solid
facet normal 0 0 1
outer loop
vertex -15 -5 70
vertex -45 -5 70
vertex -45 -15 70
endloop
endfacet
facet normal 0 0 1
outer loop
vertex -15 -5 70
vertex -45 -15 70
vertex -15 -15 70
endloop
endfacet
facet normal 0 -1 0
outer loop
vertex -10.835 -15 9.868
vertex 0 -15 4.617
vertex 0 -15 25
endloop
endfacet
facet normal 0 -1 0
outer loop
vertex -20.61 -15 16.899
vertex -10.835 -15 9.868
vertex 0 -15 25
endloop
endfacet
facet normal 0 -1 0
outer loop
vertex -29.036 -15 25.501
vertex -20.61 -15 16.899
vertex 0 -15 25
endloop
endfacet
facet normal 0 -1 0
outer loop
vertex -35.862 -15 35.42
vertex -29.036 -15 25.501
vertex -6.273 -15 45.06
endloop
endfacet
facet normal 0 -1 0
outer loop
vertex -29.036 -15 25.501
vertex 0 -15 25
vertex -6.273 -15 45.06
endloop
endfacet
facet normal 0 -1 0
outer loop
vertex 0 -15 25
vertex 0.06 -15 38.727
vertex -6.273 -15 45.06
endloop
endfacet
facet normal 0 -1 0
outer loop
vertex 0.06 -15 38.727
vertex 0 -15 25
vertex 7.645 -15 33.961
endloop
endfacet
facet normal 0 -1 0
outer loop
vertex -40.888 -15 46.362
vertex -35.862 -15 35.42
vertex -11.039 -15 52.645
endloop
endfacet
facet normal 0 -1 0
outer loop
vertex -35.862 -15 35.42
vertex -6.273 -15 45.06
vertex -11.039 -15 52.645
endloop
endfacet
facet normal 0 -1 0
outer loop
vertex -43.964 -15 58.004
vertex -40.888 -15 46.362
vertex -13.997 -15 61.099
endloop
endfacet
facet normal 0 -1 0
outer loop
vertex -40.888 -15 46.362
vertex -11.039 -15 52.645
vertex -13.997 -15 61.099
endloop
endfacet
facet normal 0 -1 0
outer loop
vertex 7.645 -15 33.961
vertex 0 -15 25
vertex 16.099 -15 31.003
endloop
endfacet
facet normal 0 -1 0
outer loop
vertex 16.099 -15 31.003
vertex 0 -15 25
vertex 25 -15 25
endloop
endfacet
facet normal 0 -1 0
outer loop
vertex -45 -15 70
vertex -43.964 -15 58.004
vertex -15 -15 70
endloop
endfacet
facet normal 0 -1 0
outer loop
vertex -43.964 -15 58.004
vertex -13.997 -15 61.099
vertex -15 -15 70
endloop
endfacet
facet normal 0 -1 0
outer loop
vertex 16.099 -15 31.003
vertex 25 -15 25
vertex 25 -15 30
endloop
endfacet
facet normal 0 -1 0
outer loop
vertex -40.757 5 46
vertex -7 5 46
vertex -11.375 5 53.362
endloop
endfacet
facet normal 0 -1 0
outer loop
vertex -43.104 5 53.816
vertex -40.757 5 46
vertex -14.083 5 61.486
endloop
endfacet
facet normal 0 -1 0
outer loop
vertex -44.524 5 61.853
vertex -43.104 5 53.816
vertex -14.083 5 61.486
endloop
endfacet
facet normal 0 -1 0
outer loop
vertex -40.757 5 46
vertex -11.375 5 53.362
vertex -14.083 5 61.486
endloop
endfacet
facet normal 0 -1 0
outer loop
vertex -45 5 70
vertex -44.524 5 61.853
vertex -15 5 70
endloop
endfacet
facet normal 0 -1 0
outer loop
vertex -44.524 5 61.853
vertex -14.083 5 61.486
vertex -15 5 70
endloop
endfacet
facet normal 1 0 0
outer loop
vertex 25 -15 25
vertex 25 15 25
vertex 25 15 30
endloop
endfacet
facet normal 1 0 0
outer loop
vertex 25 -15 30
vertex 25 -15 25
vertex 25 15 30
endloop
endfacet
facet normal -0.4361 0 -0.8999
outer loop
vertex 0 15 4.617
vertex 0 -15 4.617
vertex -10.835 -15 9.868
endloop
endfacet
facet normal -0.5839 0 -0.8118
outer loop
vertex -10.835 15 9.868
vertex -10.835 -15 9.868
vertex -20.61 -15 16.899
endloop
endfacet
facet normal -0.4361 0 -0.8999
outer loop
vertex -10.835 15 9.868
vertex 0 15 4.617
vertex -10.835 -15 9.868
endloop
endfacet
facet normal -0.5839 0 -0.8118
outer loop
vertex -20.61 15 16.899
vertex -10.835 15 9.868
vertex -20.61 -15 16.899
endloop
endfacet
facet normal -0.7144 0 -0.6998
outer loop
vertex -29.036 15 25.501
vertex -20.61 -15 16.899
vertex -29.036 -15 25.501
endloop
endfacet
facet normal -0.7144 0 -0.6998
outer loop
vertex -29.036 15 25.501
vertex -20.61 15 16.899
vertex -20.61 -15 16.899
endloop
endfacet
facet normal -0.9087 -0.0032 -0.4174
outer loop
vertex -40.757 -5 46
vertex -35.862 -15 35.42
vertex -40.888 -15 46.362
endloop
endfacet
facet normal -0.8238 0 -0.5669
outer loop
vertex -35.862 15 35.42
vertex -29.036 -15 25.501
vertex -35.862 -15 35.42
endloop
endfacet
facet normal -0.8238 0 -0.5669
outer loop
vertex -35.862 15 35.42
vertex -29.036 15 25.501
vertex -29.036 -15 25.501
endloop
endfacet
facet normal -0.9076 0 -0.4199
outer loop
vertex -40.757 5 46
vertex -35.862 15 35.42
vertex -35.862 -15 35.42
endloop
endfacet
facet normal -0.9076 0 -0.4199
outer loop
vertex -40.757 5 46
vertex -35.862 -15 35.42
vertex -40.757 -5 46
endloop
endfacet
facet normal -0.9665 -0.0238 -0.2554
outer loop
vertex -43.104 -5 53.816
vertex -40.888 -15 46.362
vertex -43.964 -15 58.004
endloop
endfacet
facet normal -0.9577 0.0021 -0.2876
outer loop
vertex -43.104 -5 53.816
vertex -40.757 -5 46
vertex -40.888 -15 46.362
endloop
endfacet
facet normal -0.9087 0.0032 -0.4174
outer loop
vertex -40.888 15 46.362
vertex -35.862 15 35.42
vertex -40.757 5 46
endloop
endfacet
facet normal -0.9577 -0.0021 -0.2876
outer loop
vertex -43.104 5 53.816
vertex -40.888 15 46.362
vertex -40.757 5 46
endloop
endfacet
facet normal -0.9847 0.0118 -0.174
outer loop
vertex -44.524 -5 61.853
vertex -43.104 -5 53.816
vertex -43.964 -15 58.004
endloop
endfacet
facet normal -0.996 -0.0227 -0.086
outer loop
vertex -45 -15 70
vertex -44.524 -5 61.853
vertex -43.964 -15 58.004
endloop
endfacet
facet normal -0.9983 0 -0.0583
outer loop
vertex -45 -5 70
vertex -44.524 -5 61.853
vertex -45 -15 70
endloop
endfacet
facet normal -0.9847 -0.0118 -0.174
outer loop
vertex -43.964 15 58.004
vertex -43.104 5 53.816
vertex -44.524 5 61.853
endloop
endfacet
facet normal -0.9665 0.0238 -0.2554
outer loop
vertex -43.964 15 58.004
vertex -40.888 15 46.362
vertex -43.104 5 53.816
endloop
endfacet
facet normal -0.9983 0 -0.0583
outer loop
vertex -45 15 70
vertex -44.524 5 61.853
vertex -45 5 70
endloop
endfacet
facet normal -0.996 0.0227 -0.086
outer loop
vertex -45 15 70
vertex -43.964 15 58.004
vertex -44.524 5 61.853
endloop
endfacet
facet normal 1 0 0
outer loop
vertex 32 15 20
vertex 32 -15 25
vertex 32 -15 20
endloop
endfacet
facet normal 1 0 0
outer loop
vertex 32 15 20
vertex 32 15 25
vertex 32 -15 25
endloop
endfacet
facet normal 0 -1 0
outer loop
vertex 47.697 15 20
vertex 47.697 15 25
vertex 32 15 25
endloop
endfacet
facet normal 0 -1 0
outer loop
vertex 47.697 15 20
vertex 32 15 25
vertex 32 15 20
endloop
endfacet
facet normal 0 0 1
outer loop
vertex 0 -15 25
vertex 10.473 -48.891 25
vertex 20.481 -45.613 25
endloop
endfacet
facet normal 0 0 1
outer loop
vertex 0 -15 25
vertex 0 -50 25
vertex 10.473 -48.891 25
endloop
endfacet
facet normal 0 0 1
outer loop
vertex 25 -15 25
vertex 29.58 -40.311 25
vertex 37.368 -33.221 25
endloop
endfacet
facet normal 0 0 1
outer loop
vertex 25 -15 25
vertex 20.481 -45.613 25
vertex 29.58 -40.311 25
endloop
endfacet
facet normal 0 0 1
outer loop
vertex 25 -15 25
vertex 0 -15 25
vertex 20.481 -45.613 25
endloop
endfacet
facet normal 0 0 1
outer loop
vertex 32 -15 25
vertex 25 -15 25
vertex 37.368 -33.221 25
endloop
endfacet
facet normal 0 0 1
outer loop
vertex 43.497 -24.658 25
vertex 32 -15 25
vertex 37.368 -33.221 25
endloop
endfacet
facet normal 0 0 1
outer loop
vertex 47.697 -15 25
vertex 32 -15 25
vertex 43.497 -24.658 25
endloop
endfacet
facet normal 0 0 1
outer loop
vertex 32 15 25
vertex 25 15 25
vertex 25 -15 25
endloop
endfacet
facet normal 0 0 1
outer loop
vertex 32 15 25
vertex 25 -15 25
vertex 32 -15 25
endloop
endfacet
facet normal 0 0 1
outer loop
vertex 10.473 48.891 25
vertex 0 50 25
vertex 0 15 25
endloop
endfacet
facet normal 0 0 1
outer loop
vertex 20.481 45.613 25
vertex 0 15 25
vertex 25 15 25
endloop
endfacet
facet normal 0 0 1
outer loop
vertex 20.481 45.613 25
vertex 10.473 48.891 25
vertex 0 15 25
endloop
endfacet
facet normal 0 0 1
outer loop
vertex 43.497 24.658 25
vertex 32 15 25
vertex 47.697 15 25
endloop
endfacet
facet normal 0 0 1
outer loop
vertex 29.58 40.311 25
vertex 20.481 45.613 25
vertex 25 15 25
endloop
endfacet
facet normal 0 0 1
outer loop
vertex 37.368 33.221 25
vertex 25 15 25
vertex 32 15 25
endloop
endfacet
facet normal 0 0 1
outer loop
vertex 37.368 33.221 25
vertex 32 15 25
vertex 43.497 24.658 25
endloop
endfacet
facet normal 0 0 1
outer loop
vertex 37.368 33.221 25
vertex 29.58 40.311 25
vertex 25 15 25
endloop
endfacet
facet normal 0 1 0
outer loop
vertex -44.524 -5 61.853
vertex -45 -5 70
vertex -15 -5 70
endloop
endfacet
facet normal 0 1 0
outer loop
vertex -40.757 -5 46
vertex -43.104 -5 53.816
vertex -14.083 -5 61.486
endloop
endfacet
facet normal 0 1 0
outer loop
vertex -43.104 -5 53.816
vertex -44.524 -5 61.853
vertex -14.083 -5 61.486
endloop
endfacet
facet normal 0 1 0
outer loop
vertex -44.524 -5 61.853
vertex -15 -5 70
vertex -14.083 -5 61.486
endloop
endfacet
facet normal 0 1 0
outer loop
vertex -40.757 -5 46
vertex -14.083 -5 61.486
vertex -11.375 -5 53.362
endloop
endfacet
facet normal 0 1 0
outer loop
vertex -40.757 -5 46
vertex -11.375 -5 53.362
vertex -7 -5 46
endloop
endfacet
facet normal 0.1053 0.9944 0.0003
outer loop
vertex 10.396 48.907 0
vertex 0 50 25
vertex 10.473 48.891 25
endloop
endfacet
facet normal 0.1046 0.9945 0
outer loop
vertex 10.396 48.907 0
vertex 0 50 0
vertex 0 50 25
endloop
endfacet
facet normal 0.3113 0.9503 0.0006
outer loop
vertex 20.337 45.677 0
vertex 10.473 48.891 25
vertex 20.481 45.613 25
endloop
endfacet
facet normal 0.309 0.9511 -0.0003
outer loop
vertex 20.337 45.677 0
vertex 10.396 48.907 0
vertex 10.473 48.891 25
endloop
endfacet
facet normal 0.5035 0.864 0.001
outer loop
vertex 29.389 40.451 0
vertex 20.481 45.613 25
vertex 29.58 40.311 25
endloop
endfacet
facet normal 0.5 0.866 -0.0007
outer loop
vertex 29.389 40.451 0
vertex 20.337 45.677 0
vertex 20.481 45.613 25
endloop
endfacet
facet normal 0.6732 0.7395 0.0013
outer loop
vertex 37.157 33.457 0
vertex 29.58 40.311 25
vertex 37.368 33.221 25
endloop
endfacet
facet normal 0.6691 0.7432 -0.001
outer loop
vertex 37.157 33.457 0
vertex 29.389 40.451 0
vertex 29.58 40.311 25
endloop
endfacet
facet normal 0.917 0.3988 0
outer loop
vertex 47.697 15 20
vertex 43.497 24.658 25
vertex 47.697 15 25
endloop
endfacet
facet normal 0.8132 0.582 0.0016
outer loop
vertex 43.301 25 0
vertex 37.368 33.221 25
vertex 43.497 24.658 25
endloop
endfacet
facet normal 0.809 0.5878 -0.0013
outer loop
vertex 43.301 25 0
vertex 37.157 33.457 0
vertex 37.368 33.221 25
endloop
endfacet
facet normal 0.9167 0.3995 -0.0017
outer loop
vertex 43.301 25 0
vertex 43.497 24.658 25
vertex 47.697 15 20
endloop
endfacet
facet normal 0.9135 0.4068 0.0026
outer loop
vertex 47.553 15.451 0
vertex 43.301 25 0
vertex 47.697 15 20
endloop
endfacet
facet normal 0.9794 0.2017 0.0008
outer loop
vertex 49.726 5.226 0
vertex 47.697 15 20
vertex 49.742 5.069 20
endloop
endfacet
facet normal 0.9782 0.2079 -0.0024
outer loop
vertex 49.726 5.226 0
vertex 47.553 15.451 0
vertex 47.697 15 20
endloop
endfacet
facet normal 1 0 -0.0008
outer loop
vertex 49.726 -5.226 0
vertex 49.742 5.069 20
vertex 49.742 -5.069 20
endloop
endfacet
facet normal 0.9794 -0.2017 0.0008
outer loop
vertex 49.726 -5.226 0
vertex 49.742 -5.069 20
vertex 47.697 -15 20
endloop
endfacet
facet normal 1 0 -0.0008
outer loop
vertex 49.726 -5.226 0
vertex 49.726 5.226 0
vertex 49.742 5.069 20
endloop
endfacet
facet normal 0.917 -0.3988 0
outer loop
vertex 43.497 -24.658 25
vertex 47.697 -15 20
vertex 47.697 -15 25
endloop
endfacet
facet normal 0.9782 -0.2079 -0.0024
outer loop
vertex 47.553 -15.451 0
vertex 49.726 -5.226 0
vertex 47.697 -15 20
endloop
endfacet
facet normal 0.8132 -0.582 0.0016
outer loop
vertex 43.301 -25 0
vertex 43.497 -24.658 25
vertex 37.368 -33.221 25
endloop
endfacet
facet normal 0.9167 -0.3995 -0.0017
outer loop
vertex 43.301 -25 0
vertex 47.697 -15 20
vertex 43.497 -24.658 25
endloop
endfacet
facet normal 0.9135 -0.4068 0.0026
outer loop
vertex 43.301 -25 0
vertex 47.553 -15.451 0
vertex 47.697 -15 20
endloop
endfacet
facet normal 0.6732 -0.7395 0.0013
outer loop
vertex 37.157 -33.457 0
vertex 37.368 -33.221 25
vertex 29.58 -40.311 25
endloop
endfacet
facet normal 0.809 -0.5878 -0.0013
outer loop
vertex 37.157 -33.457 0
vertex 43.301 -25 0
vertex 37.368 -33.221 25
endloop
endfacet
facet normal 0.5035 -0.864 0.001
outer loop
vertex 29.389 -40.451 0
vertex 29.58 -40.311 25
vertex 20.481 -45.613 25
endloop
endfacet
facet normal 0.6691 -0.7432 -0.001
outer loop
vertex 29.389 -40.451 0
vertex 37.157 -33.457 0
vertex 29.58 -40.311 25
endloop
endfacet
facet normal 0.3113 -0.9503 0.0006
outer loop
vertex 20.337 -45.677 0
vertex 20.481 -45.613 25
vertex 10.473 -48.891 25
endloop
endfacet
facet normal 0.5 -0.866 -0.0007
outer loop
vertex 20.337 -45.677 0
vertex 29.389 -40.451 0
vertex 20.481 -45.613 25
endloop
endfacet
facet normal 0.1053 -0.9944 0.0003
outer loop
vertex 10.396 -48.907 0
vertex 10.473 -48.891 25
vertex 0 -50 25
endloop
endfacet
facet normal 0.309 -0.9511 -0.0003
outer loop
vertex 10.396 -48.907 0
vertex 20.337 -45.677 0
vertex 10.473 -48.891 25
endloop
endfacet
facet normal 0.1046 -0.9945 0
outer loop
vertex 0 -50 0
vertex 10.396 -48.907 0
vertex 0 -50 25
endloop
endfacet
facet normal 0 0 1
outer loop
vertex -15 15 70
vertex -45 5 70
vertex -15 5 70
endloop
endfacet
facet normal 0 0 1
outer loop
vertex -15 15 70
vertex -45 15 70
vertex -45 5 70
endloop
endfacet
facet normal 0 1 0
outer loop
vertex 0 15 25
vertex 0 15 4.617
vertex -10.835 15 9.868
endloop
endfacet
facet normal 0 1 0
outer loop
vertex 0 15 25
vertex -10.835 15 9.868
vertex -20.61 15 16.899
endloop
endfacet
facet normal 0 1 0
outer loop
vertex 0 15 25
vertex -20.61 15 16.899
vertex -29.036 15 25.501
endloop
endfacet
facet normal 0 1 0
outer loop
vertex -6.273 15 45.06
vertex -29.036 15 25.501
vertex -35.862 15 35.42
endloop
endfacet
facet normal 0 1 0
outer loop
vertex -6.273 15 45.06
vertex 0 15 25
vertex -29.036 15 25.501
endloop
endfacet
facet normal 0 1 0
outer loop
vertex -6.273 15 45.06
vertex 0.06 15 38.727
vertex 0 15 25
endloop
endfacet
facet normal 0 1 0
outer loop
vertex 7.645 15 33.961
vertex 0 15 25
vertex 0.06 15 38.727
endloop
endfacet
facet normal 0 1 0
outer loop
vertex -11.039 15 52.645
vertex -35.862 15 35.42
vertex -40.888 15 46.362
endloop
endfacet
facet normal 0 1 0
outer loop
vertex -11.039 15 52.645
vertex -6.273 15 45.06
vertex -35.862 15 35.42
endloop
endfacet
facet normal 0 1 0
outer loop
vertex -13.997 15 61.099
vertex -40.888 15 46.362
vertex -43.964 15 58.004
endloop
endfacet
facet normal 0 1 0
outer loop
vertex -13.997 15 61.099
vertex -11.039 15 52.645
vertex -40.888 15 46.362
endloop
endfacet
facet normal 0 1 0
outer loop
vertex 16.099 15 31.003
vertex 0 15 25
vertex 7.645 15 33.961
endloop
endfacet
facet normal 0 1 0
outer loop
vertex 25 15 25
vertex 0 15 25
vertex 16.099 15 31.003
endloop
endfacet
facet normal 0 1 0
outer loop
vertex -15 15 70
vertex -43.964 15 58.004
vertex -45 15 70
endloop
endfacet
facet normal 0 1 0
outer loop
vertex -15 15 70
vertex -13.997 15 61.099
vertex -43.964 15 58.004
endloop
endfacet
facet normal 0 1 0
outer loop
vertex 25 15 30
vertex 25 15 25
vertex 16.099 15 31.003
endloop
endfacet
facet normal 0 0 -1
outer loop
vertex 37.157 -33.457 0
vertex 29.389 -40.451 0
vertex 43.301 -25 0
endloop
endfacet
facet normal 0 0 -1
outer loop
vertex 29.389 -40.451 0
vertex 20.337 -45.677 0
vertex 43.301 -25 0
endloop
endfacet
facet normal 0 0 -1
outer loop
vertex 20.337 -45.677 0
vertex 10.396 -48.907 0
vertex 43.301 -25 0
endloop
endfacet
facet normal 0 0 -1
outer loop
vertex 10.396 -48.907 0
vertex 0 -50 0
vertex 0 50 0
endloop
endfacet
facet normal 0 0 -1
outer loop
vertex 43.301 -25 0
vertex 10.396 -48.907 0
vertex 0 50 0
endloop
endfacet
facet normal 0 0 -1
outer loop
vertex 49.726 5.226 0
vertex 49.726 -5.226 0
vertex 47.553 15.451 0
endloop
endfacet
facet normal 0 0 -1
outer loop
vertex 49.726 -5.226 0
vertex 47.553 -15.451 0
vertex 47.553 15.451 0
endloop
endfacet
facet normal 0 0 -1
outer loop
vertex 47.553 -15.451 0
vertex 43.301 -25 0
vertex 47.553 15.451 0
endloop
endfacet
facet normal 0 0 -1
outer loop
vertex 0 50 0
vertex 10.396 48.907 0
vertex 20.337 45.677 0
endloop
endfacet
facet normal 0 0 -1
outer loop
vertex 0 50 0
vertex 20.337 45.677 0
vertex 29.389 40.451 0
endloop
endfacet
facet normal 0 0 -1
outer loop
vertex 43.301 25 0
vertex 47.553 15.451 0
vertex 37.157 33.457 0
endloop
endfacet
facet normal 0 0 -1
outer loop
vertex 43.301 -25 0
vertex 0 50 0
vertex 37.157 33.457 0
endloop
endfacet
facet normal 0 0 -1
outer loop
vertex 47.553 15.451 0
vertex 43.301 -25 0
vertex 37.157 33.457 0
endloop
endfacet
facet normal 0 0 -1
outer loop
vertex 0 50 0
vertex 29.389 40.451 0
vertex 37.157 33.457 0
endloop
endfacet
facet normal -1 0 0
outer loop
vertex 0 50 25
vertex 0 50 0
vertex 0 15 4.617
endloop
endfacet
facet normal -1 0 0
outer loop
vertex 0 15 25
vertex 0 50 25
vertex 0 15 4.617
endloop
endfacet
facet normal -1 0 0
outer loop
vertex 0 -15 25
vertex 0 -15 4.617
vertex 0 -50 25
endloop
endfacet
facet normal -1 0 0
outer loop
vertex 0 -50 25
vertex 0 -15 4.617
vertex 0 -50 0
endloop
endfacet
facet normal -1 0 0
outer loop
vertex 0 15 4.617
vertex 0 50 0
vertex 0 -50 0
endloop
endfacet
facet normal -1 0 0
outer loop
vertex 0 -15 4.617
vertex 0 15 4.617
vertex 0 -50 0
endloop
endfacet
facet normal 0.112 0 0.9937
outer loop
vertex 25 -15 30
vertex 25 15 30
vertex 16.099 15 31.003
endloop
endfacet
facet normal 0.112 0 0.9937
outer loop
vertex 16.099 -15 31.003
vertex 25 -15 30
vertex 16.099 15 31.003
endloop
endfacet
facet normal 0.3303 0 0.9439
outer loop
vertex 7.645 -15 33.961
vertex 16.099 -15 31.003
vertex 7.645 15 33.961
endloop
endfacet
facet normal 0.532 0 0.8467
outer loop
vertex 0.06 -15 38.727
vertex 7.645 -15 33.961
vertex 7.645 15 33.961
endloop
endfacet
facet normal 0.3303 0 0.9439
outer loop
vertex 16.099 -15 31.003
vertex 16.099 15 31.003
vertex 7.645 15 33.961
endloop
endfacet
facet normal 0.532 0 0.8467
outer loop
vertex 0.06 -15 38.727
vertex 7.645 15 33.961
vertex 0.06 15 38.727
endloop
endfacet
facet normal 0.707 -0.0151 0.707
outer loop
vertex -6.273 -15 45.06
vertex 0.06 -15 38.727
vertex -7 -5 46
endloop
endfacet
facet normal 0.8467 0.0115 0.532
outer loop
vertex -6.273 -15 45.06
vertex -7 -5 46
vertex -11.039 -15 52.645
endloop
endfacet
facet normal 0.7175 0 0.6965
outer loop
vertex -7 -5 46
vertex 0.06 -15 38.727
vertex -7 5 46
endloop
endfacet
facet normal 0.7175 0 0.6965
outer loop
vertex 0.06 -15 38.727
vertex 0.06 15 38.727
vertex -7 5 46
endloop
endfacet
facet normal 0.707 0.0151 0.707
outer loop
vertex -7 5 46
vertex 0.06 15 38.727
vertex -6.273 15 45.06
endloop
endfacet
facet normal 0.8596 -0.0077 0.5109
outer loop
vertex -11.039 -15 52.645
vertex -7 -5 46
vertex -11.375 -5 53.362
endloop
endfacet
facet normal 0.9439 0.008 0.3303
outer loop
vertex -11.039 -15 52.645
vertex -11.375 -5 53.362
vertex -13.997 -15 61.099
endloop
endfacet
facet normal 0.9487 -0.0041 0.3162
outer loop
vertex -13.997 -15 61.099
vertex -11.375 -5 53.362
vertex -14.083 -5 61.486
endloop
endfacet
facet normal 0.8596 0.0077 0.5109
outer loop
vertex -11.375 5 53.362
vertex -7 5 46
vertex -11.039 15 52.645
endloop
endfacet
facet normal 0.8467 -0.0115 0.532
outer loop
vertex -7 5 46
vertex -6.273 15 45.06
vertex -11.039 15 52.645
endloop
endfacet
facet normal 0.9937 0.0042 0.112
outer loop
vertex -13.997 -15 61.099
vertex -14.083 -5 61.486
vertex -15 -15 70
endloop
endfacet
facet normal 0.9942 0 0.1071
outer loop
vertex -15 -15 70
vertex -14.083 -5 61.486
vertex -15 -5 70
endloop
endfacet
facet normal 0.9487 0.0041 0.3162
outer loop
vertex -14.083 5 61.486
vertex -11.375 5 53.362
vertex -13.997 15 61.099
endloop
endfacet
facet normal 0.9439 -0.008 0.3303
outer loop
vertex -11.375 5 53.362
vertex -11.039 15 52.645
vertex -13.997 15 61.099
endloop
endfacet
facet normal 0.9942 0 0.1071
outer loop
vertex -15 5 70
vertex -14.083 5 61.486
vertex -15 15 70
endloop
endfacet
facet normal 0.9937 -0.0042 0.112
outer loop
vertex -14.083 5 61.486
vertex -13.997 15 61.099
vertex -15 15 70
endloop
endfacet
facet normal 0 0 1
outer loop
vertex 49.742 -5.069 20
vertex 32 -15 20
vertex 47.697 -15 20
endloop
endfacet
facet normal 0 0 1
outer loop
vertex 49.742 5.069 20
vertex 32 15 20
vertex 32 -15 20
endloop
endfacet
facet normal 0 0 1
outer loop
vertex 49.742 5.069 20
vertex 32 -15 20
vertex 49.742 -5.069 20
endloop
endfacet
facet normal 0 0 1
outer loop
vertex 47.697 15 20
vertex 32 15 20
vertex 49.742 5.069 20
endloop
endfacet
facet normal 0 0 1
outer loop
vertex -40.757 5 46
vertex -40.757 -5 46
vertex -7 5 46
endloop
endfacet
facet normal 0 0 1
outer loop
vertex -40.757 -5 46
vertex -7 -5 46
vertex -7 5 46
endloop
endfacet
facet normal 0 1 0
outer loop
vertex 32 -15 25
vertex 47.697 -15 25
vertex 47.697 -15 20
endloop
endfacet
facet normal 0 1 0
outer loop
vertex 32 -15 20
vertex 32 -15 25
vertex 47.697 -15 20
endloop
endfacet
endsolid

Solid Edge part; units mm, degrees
sketch "Sketch1" plane through (0, 0, 0) normal (0, 0, 1) x (1, 0, 0)
  line L0 (0, 50) -> (0, -50)
  arc A0 (0, 50) -> (0, -50) centre (0, 0) cw
extrude "Protrusion1" add sketch "Sketch1" along normal blind 25
sketch "Sketch2" plane through (0, 0, 0) normal (0, -1, 0) x (1, 0, 0)
  line L0 (-45, 70) -> (-15, 70)
  arc A0 (25, 30) -> (-15, 70) centre (25, 70) cw
  line L1 (25, 0) -> (25, 30)
  arc A1 (25, 0) -> (-45, 70) centre (25, 70) cw
extrude "ExtrudedProtrusion_2" add sketch "Sketch2" along normal mid plane 30
sketch "Sketch3" plane through (0, 0, 0) normal (1, 0, 0) x (0, 1, 0)
  line L0 (-5, 70) -> (-5, 46)
  line L1 (-5, 46) -> (5, 46)
  line L2 (5, 46) -> (5, 70)
extrude "Cutout1" cut sketch "Sketch3" against normal up to next material side at (0, -4.95, 58)
sketch "Sketch4" plane through (0, 0, 0) normal (0, -1, 0) x (1, 0, 0)
  line L0 (50, 25) -> (32, 25)
  line L1 (32, 25) -> (32, 20)
  line L2 (32, 20) -> (50, 20)
  line L3 (50, 20) -> (50, 25)
extrude "Cutout2" cut sketch "Sketch4" along normal mid plane 30
